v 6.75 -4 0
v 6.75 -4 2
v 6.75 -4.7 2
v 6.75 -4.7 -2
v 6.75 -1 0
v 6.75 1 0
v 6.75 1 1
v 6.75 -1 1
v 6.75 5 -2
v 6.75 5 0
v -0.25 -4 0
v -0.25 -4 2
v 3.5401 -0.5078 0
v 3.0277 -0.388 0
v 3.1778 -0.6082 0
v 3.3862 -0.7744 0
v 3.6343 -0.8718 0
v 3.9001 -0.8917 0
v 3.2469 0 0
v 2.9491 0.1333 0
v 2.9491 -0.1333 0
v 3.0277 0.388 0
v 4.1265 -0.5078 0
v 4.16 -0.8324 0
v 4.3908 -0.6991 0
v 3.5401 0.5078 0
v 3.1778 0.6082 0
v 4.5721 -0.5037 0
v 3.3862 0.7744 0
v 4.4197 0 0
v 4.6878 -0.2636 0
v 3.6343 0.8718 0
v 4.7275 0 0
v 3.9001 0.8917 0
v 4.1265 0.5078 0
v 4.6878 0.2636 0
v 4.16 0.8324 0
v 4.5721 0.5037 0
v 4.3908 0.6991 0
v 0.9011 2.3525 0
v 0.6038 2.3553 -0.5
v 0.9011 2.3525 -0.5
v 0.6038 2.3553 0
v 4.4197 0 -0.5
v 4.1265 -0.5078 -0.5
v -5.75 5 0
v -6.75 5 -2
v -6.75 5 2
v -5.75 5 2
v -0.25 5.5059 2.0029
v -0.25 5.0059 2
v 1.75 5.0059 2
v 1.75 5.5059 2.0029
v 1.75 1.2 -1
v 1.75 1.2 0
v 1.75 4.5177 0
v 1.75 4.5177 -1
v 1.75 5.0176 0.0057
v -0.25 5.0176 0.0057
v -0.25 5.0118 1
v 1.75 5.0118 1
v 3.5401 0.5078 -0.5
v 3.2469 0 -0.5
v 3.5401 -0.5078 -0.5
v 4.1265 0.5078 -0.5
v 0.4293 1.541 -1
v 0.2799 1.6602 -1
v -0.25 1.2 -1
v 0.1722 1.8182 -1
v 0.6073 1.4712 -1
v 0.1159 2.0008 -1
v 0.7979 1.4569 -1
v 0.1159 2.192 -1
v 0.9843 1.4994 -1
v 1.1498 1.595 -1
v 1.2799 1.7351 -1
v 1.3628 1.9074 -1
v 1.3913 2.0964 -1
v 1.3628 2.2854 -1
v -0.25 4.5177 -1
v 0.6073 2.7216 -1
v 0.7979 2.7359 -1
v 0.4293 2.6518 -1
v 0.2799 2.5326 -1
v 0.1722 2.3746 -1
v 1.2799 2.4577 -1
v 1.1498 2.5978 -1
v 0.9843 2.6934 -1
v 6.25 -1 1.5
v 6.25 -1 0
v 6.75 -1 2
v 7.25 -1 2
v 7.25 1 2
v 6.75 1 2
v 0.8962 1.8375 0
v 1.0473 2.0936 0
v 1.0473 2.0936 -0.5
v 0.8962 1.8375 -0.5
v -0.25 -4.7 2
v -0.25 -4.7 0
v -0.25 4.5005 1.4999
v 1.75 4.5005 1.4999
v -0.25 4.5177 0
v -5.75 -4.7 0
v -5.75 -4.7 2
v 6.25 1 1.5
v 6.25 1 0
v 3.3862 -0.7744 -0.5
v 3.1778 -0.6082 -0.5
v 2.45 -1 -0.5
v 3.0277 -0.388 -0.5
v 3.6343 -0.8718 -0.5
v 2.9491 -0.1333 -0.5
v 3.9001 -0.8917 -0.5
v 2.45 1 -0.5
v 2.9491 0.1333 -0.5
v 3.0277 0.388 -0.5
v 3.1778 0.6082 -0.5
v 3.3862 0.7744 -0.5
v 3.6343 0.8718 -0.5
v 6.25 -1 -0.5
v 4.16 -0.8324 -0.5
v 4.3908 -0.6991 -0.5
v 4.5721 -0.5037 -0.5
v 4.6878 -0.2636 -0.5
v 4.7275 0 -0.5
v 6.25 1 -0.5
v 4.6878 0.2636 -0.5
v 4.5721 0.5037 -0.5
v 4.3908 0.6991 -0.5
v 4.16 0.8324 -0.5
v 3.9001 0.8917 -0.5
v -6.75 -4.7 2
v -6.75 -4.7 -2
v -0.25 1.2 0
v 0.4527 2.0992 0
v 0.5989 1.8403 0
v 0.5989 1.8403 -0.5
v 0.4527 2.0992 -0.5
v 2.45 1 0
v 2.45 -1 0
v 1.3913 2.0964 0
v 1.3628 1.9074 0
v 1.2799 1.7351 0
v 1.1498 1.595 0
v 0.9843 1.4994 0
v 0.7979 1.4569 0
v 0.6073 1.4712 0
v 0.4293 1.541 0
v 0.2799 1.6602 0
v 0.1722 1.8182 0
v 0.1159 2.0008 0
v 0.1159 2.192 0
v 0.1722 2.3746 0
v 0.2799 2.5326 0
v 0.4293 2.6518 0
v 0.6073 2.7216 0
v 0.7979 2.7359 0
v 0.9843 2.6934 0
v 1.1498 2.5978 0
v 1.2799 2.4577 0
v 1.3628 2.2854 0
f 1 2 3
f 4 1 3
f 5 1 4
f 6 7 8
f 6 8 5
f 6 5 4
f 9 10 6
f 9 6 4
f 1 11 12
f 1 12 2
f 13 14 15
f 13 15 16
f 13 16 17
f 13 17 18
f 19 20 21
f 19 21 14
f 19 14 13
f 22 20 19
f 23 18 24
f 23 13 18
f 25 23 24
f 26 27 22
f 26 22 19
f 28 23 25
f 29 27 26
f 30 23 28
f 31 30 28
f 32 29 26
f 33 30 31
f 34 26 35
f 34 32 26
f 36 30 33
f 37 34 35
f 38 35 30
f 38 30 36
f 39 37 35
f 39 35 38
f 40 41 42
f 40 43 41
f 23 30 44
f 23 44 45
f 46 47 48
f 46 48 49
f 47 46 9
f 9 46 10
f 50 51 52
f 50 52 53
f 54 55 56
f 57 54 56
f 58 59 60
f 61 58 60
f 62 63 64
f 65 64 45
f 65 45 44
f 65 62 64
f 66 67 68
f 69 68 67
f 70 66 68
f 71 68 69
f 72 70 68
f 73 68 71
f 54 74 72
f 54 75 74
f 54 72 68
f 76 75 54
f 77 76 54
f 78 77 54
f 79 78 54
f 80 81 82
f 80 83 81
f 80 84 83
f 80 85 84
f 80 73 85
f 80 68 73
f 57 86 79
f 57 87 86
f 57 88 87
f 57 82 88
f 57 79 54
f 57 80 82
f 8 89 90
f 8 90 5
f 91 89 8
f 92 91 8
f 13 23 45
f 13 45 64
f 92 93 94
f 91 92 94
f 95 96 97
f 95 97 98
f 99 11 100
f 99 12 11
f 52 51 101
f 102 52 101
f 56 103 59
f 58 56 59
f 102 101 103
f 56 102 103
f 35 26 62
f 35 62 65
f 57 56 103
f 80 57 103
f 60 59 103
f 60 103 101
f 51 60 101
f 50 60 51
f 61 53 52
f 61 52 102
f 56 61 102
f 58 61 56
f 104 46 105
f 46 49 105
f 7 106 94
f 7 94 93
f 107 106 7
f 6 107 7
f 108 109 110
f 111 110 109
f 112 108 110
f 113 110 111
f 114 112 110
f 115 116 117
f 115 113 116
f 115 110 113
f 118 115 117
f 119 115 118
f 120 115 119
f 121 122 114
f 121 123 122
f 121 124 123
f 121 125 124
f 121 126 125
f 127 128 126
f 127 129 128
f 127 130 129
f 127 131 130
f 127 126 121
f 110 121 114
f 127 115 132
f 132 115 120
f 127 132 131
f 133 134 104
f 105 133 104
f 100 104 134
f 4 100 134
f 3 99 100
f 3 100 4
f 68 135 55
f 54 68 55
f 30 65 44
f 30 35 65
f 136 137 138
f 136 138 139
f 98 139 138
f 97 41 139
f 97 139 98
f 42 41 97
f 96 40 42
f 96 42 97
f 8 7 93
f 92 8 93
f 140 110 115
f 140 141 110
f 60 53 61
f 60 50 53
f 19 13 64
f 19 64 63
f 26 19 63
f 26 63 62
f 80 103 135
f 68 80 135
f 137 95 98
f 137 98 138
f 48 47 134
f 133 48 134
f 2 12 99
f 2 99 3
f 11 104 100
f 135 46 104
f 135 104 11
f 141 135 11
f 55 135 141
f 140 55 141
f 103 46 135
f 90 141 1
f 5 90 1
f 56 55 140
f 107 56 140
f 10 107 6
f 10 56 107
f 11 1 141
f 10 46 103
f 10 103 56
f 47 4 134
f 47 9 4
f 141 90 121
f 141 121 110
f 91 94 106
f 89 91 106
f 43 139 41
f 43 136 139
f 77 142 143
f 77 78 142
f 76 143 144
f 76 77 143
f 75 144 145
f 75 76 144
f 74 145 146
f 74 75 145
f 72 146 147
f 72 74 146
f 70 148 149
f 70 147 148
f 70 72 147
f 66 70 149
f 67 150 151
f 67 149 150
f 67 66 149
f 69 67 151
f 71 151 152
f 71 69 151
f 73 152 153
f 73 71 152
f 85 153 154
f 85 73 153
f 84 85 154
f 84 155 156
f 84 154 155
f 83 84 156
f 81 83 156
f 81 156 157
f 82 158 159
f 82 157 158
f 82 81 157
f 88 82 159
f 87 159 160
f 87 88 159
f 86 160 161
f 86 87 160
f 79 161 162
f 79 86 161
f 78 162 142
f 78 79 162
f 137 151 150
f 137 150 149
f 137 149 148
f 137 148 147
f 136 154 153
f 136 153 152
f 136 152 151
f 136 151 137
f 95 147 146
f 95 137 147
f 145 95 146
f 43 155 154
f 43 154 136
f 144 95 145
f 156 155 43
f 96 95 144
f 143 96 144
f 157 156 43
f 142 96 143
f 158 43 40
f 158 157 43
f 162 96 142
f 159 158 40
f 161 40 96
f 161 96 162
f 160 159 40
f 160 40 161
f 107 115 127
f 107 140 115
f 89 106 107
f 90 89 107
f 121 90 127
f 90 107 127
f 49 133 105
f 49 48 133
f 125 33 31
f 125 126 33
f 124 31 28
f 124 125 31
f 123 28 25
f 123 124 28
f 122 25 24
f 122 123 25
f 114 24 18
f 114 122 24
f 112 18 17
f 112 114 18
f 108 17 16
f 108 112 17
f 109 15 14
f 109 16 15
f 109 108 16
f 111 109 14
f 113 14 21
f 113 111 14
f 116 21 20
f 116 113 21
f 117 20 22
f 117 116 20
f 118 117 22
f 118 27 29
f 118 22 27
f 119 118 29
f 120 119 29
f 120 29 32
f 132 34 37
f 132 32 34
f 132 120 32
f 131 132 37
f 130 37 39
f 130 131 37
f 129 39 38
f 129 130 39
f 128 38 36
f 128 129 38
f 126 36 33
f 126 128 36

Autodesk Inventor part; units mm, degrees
ref_plane "YZ Plane" through (0, 0, 0) normal (1, 0, 0) x (0, 1, 0)
ref_plane "XZ Plane" through (0, 0, 0) normal (0, 1, 0) x (-1, 0, 0)
ref_plane "XY Plane" through (0, 0, 0) normal (0, 0, 1) x (1, 0, 0)
sketch "Sketch1" plane through (0, 0, 0) normal (0, 0, 1) x (1, 0, 0)
  line L0 (-5.75, -4) -> (5.75, -4)
  line L1 (5.75, -4) -> (5.75, 4)
  line L2 (5.75, 4) -> (-5.75, 4)
  line L3 (-5.75, 4) -> (-5.75, -4)
  line L4 (-5.75, -4) -> (5.75, 4) construction
  line L5 (5.75, -4) -> (-5.75, 4) construction
  line L6 (-6.75, -5.5) -> (6.75, -5.5)
  line L7 (6.75, -5.5) -> (6.75, 5.5)
  line L8 (6.75, 5.5) -> (-6.75, 5.5)
  line L9 (-6.75, 5.5) -> (-6.75, -5.5)
  line L10 (-6.75, -5.5) -> (6.75, 5.5) construction
  line L11 (6.75, -5.5) -> (-6.75, 5.5) construction
  point P0 (0, 0)
  dimension "d0" = 11.5
  dimension "d1" = 8
  dimension "d2" = 13.5
  dimension "d3" = 11
extrude "Extrusion1" add sketch "Sketch1" along normal blind 2
sketch "Sketch2" plane through (0, 0, 0) normal (0, 0, -1) x (-1, 0, 0)
  line L0 (-5.75, -4.5) -> (5.75, -4.5)
  line L1 (5.75, -4.5) -> (5.75, 3.5)
  line L2 (5.75, 3.5) -> (-5.75, 3.5)
  line L3 (-5.75, 3.5) -> (-5.75, -4.5)
  line L4 (-5.75, -4.5) -> (5.75, 3.5) construction
  line L5 (5.75, -4.5) -> (-5.75, 3.5) construction
  line L6 (-6.75, -6) -> (6.75, -6)
  line L7 (6.75, -6) -> (6.75, 5)
  line L8 (6.75, 5) -> (-6.75, 5)
  line L9 (-6.75, 5) -> (-6.75, -6)
  line L10 (-6.75, -6) -> (6.75, 5) construction
  line L11 (6.75, -6) -> (-6.75, 5) construction
  point P0 (0, 0)
  point P1 (0, -0.5)
  dimension "d6" = 11.5
  dimension "d7" = 8
  dimension "d8" = 13.5
  dimension "d9" = 11
extrude "Extrusion2" add sketch "Sketch2" along normal blind 2 contours L3 L2 L1 L0 | L9 L8 L7 L6
sketch "Sketch3" plane through (0, 0, 2) normal (0, 0, 1) x (1, 0, 0)
  line L0 (6.75, -5.5) -> (6.75, 5.5) projected
  line L1 (5.75, -4) -> (6.75, -4)
  line L2 (6.75, -4) -> (6.75, -1.5)
  line L3 (6.75, -1.5) -> (5.75, -1.5)
  line L4 (5.75, -1.5) -> (5.75, -4)
  line L5 (5.75, 4) -> (5.75, -4) projected
  line L6 (5.75, 4) -> (6.75, 4)
  line L7 (6.75, 4) -> (6.75, 1.5)
  line L8 (6.75, 1.5) -> (5.75, 1.5)
  line L9 (5.75, 1.5) -> (5.75, 4)
  point P0 (0, 0)
  dimension "d12" = 2.5
  dimension "d13" = 2.5
extrude "Extrusion3" cut sketch "Sketch3" against normal blind 2 contours L1 L4 L3 L0 | L8 L5 L6 L0
sketch "Sketch4" plane through (0, 0, 2) normal (0, 0, 1) x (1, 0, 0)
  line L0 (6.75, 5.5) -> (-6.75, 5.5) projected
  line L1 (-5.75, 4) -> (-0.25, 4)
  line L2 (-0.25, 4) -> (-0.25, 5.5)
  line L3 (-0.25, 5.5) -> (-5.75, 5.5)
  line L4 (-5.75, 5.5) -> (-5.75, 4)
  line L5 (-6.75, -5.5) -> (6.75, -5.5) projected
  line L6 (-5.75, -4) -> (-0.25, -4)
  line L7 (-0.25, -4) -> (-0.25, -5.5)
  line L8 (-0.25, -5.5) -> (-5.75, -5.5)
  line L9 (-5.75, -5.5) -> (-5.75, -4)
  line L10 (-5.75, 4) -> (6.75, 4) projected
  line L11 (1.75, 4) -> (6.7628, 4)
  line L12 (6.7628, 4) -> (6.7628, 5.5)
  line L13 (6.7628, 5.5) -> (1.75, 5.5)
  line L14 (1.75, 5.5) -> (1.75, 4)
  point P0 (0, 0)
  point P1 (1.75, 5.5)
  point P2 (6.75, 4)
  point P3 (-5.75, 5.5)
  dimension "d16" = 5.5
  dimension "d17" = 5.5
  dimension "d18" = 2
extrude "Extrusion4" cut sketch "Sketch4" against normal blind 2 contours L13 L12 L11 L10 L14 L0 | L2 L1 L4 L0 | L9 L6 L7 L5
sketch "Sketch5" plane through (0, 0, 0) normal (0, 0, 1) x (1, 0, 0)
  line L0 (-6.75, -6) -> (-6.75, 5) projected
  line L1 (6.75, -5.5) -> (6.75, -6) projected
  line L2 (-6.75, -6) -> (6.75, -6)
  line L3 (6.75, -6) -> (6.75, -5.5)
  line L4 (6.75, -5.5) -> (-6.75, -5.5)
  line L5 (-6.75, -5.5) -> (-6.75, -6)
  point P0 (0, 0)
  point P1 (-6.75, -5.5)
extrude "Extrusion5" cut sketch "Sketch5" against normal blind 2
sketch "Sketch6" plane through (0, 0, 0) normal (0, 0, -1) x (-1, 0, 0)
  line L0 (-1.75, 4) -> (-1.75, 5) projected
  line L1 (-1.75, 5.5) -> (0.25, 5.5) projected
  line L2 (-1.75, 5) -> (0.25, 5)
  line L3 (0.25, 5) -> (0.25, 5.5)
  line L4 (0.25, 5.5) -> (-1.75, 5.5)
  line L5 (-1.75, 5.5) -> (-1.75, 5)
  point P0 (0, 0)
extrude "Extrusion6" cut sketch "Sketch6" against normal blind 2
sketch "Sketch7" plane through (0, 0, 0) normal (0, 0, -1) x (-1, 0, 0)
  line L0 (0.25, 5) -> (5.75, 5) projected
  line L1 (6.75, 5.5) -> (6.75, -5.5) projected
  line L2 (5.75, 5) -> (6.75, 5)
  line L3 (6.75, 5) -> (6.75, 5.5)
  line L4 (6.75, 5.5) -> (5.75, 5.5)
  line L5 (5.75, 5.5) -> (5.75, 5)
  point P0 (0, 0)
extrude "Extrusion7" cut sketch "Sketch7" against normal blind 2
sketch "Sketch8" plane through (0, 0, 0) normal (0, 0, 1) x (1, 0, 0)
  line L0 (5.75, 1.5) -> (5.75, -1.5) projected
  line L1 (5.75, -1.5) -> (5.75, 1.5)
  line L2 (-0.25, 4) -> (1.75, 4) projected
  line L3 (1.75, 4) -> (-0.25, 4)
  line L4 (-0.25, 4) -> (-0.25, 1.2)
  line L5 (-0.25, 1.2) -> (1.75, 1.2)
  line L6 (1.75, 1.2) -> (1.75, 4)
  line L7 (5.75, -1) -> (2.45, -1)
  line L8 (2.45, -1) -> (2.45, 1)
  line L9 (2.45, 1) -> (5.75, 1)
  line L10 (5.75, 1) -> (5.75, -1)
  line L11 (6.75, 1.5) -> (5.75, 1.5) projected
  line L12 (5.75, -1.5) -> (6.75, -1.5) projected
  point P0 (0, 0)
  dimension "d28" = 2.8
  dimension "d57" = 3.3
  dimension "d58" = 2
  dimension "d59" = 0.5
  dimension "d60" = 0.5
extrude "Extrusion8" cut sketch "Sketch8" against normal blind 1 contours L2 L6 L5 L4
sketch "Sketch9" plane through (0, 0, -1) normal (0, 0, 1) x (1, 0, 0)
  circle A0 centre (0.75, 2.0964) radius 0.6413
  point P0 (0, 0)
extrude "Extrusion9" add sketch "Sketch9" along normal blind 1
sketch "Sketch10" plane through (0, 0, -1) normal (0, 0, 1) x (1, 0, 0)
  circle A0 centre (4.0861, 0) radius 0.75
  point P0 (0, 0)
  dimension "d33" = 1.5
extrude "Extrusion10" add sketch "Sketch10" along normal blind 1
sketch "Sketch11" plane through (4.0861, 0, 0) normal (0, 0, 1) x (1, 0, 0)
  line L0 (0.1861, -0.3022) -> (-0.1686, -0.3123)
  line L1 (-0.1686, -0.3123) -> (-0.3547, -0.0101)
  line L2 (-0.3547, -0.0101) -> (-0.1861, 0.3022)
  line L3 (-0.1861, 0.3022) -> (0.1686, 0.3123)
  line L4 (0.1686, 0.3123) -> (0.3547, 0.0101)
  line L5 (0.3547, 0.0101) -> (0.1861, -0.3022)
  point P0 (-4.0861, 0)
  point P1 (0, 0)
extrude "Extrusion11" cut sketch "Sketch11" against normal blind 0.5
sketch "Sketch12" plane through (0.75, 2.0964, 0) normal (0, 0, 1) x (1, 0, 0)
  circle A0 centre (0, 0) radius 0.6413 projected
  line L0 (0.1462, -0.2589) -> (-0.1511, -0.2561)
  line L1 (-0.1511, -0.2561) -> (-0.2973, 0.0028)
  line L2 (-0.2973, 0.0028) -> (-0.1462, 0.2589)
  line L3 (-0.1462, 0.2589) -> (0.1511, 0.2561)
  line L4 (0.1511, 0.2561) -> (0.2973, -0.0028)
  line L5 (0.2973, -0.0028) -> (0.1462, -0.2589)
  point P0 (-0.75, -2.0964)
extrude "Extrusion12" cut sketch "Sketch12" against normal blind 0.5 contours L0 L1 L2 L3 L4 L5
sketch "Sketch13" plane through (6.75, -5.5, 2) normal (1, 0, 0) x (0, 0, -1)
  line L0 (0, 4) -> (2, 4) projected
  line L1 (0.5, 4) -> (-0.5, 4)
  line L2 (-0.5, 4) -> (-0.5, 7)
  line L3 (-0.5, 7) -> (0.5, 7)
  line L4 (0.5, 7) -> (0.5, 4)
  line L5 (2, 10.5) -> (2, 7) projected
  point P0 (2, 5.5)
  dimension "d40" = 1
  dimension "d41" = 1.5
extrude "Extrusion13" add sketch "Sketch13" along normal blind 0.5
sketch "Sketch14" plane through (5.75, 1.5, 0) normal (0, 1, 0) x (1, 0, 0)
  line L0 (1, 0) -> (1, -1.5) projected
  line L1 (1, 0) -> (1, -1)
  line L2 (1, -1) -> (1.5, -2)
  line L3 (1.5, -1.5) -> (1.5, -2.5) projected
  line L4 (0, -2) -> (1, -2) projected
  line L5 (1, -2) -> (1.5, -2)
  line L6 (0, 0) -> (1, 0) projected
  line L7 (0.5, 0) -> (0.5, -1.5)
  line L8 (0.5, -1.5) -> (1, -2)
  point P0 (-5.75, 0)
  dimension "d44" = 1
extrude "Extrusion14" add sketch "Sketch14" along normal blind 5
sketch "Sketch15" plane through (5.75, -1.5, 0) normal (0, -1, 0) x (1, 0, 0)
  line L0 (0, 2) -> (1, 2) projected
  line L1 (0, 0) -> (0, 2) projected
  line L2 (0, 0) -> (1, 0) projected
  line L3 (1, 1.5) -> (1, 0) projected
  line L4 (1, 1.5) -> (1.5, 1.5) projected
  line L5 (1.5, 2.5) -> (1.5, 1.5) projected
  line L6 (1, 2.5) -> (1.5, 2.5) projected
  line L7 (1, 2.5) -> (1, 2) projected
  point P0 (-5.75, 0)
extrude "Extrusion15" cut sketch "Sketch15" against normal blind 3
sketch "Sketch16" plane through (5.75, 1.5, 0) normal (0, -1, 0) x (1, 0, 0)
  line L0 (1, 1) -> (1.5, 2) projected
  line L1 (1.5, 2) -> (1, 2) projected
  line L2 (1, 2) -> (0.5, 1.5) projected
  line L3 (0.5, 1.5) -> (0.5, 0) projected
  line L4 (1, 0) -> (0.5, 0) projected
  line L5 (1, 1) -> (1, 0) projected
  point P0 (-5.75, 0)
extrude "Extrusion16" add sketch "Sketch16" along normal blind 3
sketch "Sketch17" plane through (5.75, 6.5, 0) normal (0, 1, 0) x (1, 0, 0)
  line L0 (1, -2) -> (1.5, -2) projected
  line L1 (1.5, -2) -> (1, -1) projected
  line L2 (1, -1) -> (1, 0) projected
  line L3 (1, 0) -> (0.5, 0) projected
  line L4 (0.5, 0) -> (0.5, -1.5) projected
  line L5 (0.5, -1.5) -> (1, -2) projected
  point P0 (-5.75, 0)
extrude "Extrusion17" cut sketch "Sketch17" against normal blind 5
sketch "Sketch18" plane through (5.75, 1.5, 0) normal (0, 1, 0) x (1, 0, 0)
  line L0 (1, -1) -> (1.5, -2) projected
  line L1 (1, 0) -> (1, -1) projected
  line L2 (0.5, 0) -> (1, 0) projected
  line L3 (0.5, -1.5) -> (0.5, 0) projected
  line L4 (1, -2) -> (0.5, -1.5) projected
  line L5 (1.5, -2) -> (1, -2) projected
  point P0 (-5.75, 0)
extrude "Extrusion18" cut sketch "Sketch18" against normal blind 0.5
sketch "Sketch19" plane through (5.75, -1.5, 0) normal (0, -1, 0) x (1, 0, 0)
  line L0 (1, 1) -> (1.5, 2) projected
  line L1 (1.5, 2) -> (1, 2) projected
  line L2 (1, 2) -> (0.5, 1.5) projected
  line L3 (0.5, 1.5) -> (0.5, 0) projected
  line L4 (1, 0) -> (0.5, 0) projected
  line L5 (1, 0) -> (1, 1) projected
  point P0 (-5.75, 0)
extrude "Extrusion19" cut sketch "Sketch19" against normal blind 0.5
sketch "Sketch20" plane through (0, 0, 0) normal (0, 0, 1) x (1, 0, 0)
  line L0 (6.25, -1) -> (6.25, 1) projected
  line L1 (6.25, -1) -> (2.45, -1)
  line L2 (2.45, -1) -> (2.45, 1)
  line L3 (2.45, 1) -> (6.25, 1)
  line L4 (6.25, 1) -> (6.25, -1)
  point P0 (0, 0)
  dimension "d61" = 3.8
  dimension "d62" = 2
extrude "Extrusion20" cut sketch "Sketch20" against normal blind 0.5
sketch "Sketch21" plane through (4.0861, 0, -0.5) normal (0, 0, 1) x (1, 0, 0)
  circle A0 centre (-0.2528, 0) radius 0.8942
  point P0 (-4.0861, 0)
extrude "Extrusion21" add sketch "Sketch21" along normal blind 0.5
sketch "Sketch22" plane through (3.8333, 0, 0) normal (0, 0, 1) x (1, 0, 0)
  line L0 (0.5864, 0) -> (0.2932, -0.5078)
  line L1 (0.2932, -0.5078) -> (-0.2932, -0.5078)
  line L2 (-0.2932, -0.5078) -> (-0.5864, 0)
  line L3 (-0.5864, 0) -> (-0.2932, 0.5078)
  line L4 (-0.2932, 0.5078) -> (0.2932, 0.5078)
  line L5 (0.2932, 0.5078) -> (0.5864, 0)
  point P0 (-3.8333, 0)
  point P1 (0, 0)
extrude "Extrusion22" cut sketch "Sketch22" against normal blind 0.5
sketch "Sketch23" plane through (-6.75, 5, -2) normal (0, 1, 0) x (1, 0, 0)
  line L0 (8.5, -4) -> (6.5, -4) projected
  line L1 (6.5, -4) -> (6.5, -2) projected
  line L2 (8.5, -4) -> (6.5, -4)
  line L3 (6.5, -4) -> (6.5, -3)
  line L4 (6.5, -3) -> (8.5, -3)
  line L5 (8.5, -3) -> (8.5, -4)
  point P0 (6.75, -2)
  dimension "d69" = 1
extrude "Extrusion23" add sketch "Sketch23" along normal blind 0.5
sketch "Sketch24" plane through (-0.25, 4, 0) normal (-1, 0, 0) x (0, 0, 1)
  line L0 (2, 1.0059) -> (2.0029, 1.5059)
  line L1 (2.0029, 1.5059) -> (1, 1.0118)
  line L2 (1, 1.0118) -> (0.0057, 1.0176)
  line L3 (0.0057, 1.0176) -> (0, 0.5177)
  line L4 (0, 0.5177) -> (1.4999, 0.5005)
  line L5 (1.4999, 0.5005) -> (2, 1.0059)
  line L6 (2, 1.5) -> (2, 0) projected
  line L7 (2, 1.0059) -> (2, 0)
  line L8 (0, 0) -> (-1, 0) projected
  line L9 (2, 0) -> (0, 0)
  line L10 (0, 0) -> (0, 0.5177)
  point P0 (0, -4)
  point P1 (-5.75, 0)
extrude "Extrusion24" add sketch "Sketch24" along normal blind 4 contours L5 L4 L3 L2 L1 L0
sketch "Sketch25" plane through (1.75, 4, 0) normal (1, 0, 0) x (0, 0, -1)
  line L0 (0, 1) -> (-1, 1) projected
  line L1 (-1, 1) -> (-1, 1.5) projected
  line L2 (-2, 1.5) -> (-1, 1.5) projected
  line L3 (-2, 0) -> (-2, 1.5) projected
  line L4 (0, 0) -> (-2, 0) projected
  line L5 (0, 0) -> (0, 1) projected
  point P0 (0, -4)
extrude "Extrusion25" cut sketch "Sketch25" against normal blind 2
sketch "Sketch26" plane through (-0.25, 4, 0) normal (1, 0, 0) x (0, 0, -1)
  line L0 (-2.0029, 1.5059) -> (-1, 1.0118) projected
  line L1 (-2, 1.0059) -> (-2.0029, 1.5059) projected
  line L2 (-2, 1.0059) -> (-1.4999, 0.5005) projected
  line L3 (-1.4999, 0.5005) -> (0, 0.5177) projected
  line L4 (0, 0.5177) -> (-0.0057, 1.0176) projected
  line L5 (-0.0057, 1.0176) -> (-1, 1.0118) projected
  point P0 (0, -4)
extrude "Extrusion26" add sketch "Sketch26" along normal blind 2
sketch "Sketch27" plane through (-4.25, 4, 0) normal (-1, 0, 0) x (0, 0, 1)
  line L0 (1.4999, 0.5005) -> (0, 0.5177) projected
  line L1 (0, 0.5177) -> (0.0057, 1.0176) projected
  line L2 (0.0057, 1.0176) -> (1, 1.0118) projected
  line L3 (1, 1.0118) -> (2.0029, 1.5059) projected
  line L4 (2.0029, 1.5059) -> (2, 1.0059) projected
  line L5 (2, 1.0059) -> (1.4999, 0.5005) projected
  point P0 (0, -4)
extrude "Extrusion27" cut sketch "Sketch27" against normal blind 4
sketch "Sketch28" plane through (0, 0, 0) normal (0, 0, 1) x (1, 0, 0)
  line L0 (-0.25, 1.2) -> (-0.25, 4) projected
  line L1 (1.75, 4.5177) -> (1.75, 5.0176) projected
  line L2 (-0.25, 4) -> (1.75, 4)
  line L3 (1.75, 4) -> (1.75, 4.5177)
  line L4 (1.75, 4.5177) -> (-0.25, 4.5177)
  line L5 (-0.25, 4.5177) -> (-0.25, 4)
  point P0 (0, 0)
extrude "Extrusion28" cut sketch "Sketch28" against normal blind 1
sketch "Sketch29" plane through (-6.75, -5.5, 2) normal (0, -1, 0) x (1, 0, 0)
  line L0 (1, -2) -> (1, 0) projected
  line L1 (0, 0) -> (1, 0) projected
  line L2 (0, -4) -> (0, 0) projected
  line L3 (13.5, -4) -> (0, -4) projected
  line L4 (13.5, 0) -> (13.5, -4) projected
  line L5 (6.5, 0) -> (13.5, 0) projected
  line L6 (6.5, 0) -> (6.5, -2) projected
  line L7 (1, -2) -> (6.5, -2) projected
  point P0 (6.75, -2)
extrude "Extrusion29" cut sketch "Sketch29" against normal blind 0.5
sketch "Sketch30" plane through (-6.75, -5, 2) normal (0, -1, 0) x (1, 0, 0)
  line L0 (1, -2) -> (6.5, -2) projected
  line L1 (1, 0) -> (1, -2) projected
  line L2 (0, 0) -> (1, 0) projected
  line L3 (0, -4) -> (0, 0) projected
  line L4 (13.5, -4) -> (0, -4) projected
  line L5 (13.5, 0) -> (13.5, -4) projected
  line L6 (6.5, 0) -> (13.5, 0) projected
  line L7 (6.5, -2) -> (6.5, 0) projected
  point P0 (6.75, -2)
extrude "Extrusion30" cut sketch "Sketch30" against normal blind 0.3
properties part number "Catcher"
